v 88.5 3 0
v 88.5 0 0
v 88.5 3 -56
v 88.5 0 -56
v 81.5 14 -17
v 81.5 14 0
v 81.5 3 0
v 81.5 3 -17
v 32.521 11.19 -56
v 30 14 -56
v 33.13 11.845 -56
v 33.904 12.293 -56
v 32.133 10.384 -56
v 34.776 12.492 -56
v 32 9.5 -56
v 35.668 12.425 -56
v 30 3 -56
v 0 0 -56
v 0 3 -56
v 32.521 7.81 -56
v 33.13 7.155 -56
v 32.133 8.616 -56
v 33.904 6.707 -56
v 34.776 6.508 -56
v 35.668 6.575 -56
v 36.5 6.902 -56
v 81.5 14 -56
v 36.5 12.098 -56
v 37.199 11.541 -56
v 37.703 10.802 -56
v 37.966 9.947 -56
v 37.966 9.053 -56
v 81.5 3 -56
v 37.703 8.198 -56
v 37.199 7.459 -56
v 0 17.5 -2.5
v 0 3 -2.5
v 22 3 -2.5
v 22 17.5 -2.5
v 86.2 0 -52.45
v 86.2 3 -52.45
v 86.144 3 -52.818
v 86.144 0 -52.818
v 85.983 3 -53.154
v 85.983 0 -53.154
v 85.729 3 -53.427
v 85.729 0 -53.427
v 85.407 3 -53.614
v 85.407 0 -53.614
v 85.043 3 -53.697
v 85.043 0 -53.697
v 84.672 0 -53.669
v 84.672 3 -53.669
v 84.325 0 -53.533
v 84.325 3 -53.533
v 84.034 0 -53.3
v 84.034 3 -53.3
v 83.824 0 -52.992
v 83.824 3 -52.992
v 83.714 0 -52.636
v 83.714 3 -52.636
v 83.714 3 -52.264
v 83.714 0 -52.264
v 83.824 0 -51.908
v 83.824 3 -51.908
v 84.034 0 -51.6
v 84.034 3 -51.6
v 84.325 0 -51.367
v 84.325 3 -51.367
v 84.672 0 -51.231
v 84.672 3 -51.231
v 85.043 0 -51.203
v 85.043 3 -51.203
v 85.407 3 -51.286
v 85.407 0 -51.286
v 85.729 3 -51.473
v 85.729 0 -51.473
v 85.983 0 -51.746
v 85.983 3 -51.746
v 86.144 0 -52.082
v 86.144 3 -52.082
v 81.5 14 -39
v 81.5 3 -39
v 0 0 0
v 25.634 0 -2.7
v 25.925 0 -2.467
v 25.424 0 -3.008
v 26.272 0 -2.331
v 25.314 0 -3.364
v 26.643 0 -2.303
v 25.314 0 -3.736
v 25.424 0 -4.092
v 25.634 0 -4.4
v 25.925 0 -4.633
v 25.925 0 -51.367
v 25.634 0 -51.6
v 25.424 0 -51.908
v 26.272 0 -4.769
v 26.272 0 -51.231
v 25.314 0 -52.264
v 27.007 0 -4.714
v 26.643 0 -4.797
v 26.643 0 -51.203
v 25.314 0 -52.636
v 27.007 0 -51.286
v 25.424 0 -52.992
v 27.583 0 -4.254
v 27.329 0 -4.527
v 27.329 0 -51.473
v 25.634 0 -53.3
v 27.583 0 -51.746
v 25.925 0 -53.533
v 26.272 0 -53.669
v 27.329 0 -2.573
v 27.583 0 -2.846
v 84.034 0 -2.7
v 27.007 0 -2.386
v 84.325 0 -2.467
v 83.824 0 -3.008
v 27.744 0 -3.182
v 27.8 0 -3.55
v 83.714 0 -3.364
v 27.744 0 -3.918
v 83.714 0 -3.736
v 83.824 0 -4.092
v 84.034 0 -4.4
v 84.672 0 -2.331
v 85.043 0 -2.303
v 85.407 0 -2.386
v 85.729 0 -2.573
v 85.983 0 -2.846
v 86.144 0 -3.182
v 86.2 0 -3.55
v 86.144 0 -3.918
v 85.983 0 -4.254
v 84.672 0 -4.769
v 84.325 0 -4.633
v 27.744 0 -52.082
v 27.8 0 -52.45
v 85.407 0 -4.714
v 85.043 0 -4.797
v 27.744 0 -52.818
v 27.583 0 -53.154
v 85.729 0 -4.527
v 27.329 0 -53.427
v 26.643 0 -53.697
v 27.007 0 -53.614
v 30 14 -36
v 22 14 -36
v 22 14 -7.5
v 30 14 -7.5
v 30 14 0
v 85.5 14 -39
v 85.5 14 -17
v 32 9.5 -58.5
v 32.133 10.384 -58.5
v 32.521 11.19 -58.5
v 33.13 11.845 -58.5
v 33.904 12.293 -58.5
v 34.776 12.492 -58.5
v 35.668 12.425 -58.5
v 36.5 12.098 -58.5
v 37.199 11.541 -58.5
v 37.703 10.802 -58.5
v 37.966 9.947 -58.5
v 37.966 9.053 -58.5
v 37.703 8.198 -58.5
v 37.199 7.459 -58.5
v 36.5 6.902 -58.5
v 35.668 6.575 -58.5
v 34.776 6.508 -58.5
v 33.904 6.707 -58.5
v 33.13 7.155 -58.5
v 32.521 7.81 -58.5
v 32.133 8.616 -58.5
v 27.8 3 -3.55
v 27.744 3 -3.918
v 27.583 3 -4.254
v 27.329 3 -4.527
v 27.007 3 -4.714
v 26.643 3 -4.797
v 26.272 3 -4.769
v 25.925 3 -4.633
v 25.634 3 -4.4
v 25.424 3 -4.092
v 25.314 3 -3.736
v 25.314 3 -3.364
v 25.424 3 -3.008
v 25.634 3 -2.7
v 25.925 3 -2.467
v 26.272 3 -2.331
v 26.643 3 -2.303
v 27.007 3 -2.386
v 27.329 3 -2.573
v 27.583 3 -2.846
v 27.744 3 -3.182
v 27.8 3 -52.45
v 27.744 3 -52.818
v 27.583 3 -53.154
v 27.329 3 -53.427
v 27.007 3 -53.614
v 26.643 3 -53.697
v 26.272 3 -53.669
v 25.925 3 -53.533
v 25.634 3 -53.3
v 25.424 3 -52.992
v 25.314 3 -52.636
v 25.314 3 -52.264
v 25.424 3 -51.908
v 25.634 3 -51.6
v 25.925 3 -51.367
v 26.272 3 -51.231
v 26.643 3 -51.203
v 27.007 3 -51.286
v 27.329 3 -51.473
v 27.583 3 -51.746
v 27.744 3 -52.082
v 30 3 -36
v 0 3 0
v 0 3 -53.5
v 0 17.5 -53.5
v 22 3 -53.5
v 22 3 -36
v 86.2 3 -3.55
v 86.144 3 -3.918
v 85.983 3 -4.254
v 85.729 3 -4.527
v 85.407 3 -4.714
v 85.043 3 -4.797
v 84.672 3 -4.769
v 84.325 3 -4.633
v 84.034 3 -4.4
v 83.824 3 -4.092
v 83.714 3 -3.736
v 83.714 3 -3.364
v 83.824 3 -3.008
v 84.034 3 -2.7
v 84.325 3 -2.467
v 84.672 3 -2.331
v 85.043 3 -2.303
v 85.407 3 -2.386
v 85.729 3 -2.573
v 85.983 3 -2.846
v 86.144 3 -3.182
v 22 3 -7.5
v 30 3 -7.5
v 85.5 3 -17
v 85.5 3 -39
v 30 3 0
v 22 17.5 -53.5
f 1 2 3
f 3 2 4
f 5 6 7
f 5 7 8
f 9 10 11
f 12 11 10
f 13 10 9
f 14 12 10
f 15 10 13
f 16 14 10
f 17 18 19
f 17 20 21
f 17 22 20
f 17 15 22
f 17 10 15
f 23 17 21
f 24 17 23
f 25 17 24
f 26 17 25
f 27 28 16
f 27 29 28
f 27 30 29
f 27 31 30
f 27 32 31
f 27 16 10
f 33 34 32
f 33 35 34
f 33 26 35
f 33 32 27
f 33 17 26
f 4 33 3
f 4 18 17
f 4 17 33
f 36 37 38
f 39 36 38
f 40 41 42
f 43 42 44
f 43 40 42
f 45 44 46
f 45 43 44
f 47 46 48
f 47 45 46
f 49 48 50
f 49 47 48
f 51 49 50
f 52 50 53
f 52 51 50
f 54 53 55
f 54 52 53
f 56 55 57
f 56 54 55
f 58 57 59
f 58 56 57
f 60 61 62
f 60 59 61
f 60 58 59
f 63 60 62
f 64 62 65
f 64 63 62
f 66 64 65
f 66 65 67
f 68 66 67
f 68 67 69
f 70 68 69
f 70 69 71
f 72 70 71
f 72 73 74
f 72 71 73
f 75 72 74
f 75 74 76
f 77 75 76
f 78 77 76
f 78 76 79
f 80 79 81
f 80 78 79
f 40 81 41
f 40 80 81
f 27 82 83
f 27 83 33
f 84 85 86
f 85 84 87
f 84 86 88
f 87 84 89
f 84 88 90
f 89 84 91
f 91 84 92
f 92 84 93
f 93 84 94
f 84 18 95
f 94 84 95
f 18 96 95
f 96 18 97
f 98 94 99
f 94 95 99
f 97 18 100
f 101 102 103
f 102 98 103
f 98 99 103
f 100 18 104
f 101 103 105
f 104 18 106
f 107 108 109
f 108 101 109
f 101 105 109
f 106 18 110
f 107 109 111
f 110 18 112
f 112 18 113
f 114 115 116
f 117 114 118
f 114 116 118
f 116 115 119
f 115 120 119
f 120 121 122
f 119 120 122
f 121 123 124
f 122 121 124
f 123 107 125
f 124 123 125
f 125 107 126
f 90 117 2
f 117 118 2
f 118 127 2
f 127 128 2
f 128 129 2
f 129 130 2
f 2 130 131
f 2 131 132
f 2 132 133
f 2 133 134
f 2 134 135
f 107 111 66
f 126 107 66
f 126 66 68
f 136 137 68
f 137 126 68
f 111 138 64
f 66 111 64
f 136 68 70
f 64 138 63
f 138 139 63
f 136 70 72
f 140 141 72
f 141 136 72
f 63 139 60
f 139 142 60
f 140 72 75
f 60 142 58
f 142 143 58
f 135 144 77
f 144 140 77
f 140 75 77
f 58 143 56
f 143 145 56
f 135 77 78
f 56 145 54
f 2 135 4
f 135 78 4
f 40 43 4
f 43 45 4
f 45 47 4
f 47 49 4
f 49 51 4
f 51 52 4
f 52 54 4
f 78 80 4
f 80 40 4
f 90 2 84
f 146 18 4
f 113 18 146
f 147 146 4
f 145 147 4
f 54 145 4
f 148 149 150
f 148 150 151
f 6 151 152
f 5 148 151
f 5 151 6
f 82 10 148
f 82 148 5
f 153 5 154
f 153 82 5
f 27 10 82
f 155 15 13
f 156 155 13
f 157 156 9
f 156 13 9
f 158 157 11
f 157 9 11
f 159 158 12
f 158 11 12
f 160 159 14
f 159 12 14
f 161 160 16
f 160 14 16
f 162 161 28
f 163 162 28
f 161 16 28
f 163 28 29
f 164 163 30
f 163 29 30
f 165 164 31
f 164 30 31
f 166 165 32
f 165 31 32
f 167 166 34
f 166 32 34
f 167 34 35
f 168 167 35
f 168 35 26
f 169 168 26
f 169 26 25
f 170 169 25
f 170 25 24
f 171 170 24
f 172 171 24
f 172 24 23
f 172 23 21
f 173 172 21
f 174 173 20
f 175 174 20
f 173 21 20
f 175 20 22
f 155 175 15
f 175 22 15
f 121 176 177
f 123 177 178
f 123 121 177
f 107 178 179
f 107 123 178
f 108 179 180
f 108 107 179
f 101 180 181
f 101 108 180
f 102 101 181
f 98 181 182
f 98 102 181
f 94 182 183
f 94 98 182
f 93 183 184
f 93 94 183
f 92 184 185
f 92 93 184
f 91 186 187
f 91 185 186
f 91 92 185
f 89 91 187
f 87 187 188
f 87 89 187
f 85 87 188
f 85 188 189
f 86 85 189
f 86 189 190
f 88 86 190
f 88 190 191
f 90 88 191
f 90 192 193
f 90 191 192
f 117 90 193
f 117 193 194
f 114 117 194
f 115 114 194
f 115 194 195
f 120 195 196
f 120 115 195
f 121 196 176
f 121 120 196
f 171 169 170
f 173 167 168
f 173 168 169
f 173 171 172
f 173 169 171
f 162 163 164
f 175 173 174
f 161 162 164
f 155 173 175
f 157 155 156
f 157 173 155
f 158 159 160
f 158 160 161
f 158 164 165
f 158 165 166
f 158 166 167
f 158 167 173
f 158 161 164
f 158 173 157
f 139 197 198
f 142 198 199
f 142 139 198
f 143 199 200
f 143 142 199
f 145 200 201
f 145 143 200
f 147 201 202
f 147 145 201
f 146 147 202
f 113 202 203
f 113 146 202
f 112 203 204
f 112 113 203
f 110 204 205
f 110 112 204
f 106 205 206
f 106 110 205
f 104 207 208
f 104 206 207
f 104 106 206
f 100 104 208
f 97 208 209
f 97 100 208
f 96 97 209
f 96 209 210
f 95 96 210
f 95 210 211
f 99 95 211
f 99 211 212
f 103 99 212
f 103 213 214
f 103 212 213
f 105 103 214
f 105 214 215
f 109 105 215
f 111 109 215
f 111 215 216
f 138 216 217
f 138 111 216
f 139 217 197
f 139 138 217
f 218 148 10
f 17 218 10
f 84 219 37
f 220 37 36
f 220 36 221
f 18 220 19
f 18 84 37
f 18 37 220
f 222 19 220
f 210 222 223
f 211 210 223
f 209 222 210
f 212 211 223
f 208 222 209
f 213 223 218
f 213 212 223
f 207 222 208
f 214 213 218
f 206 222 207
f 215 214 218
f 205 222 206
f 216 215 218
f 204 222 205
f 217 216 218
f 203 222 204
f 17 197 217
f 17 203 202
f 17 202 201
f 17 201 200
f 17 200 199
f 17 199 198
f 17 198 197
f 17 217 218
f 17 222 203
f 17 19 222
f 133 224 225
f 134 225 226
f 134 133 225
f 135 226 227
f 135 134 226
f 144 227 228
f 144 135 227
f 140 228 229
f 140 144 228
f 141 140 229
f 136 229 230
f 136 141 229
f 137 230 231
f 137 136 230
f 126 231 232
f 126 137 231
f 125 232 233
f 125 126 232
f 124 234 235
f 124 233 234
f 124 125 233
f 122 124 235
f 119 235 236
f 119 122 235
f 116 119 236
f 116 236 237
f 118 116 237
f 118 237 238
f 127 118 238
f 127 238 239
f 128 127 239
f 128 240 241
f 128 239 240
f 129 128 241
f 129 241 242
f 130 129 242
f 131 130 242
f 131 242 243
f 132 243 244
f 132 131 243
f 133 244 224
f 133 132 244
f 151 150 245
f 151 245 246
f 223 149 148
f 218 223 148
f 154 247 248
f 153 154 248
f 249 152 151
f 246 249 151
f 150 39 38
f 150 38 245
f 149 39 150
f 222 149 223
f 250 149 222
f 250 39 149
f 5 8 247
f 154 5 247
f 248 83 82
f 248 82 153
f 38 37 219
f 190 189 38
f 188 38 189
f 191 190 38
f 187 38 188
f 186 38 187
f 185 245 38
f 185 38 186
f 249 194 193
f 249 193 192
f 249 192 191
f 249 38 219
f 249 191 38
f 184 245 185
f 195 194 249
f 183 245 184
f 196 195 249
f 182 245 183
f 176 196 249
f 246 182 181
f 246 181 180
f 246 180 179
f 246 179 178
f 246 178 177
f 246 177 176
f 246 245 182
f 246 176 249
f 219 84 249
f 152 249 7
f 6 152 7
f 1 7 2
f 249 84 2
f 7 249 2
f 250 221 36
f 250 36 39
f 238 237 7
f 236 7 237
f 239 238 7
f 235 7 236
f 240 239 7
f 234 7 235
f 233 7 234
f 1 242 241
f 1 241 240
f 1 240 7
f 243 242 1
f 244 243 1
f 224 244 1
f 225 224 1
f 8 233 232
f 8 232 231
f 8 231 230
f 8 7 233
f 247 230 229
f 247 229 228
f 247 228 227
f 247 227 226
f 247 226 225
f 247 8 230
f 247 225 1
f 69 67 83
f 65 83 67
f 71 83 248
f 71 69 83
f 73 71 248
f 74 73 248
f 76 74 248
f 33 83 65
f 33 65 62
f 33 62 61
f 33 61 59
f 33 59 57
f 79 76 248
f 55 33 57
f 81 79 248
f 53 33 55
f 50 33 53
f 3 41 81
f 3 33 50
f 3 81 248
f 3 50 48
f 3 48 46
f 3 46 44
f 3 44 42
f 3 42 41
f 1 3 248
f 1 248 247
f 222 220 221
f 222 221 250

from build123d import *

# Parameters (mm, degrees)
SKETCH2_W               = 88.5
SKETCH2_H               = 56
BOSS_EXTRUDE1_DEPTH     = 3
SKETCH3_W               = 63.5
SKETCH3_H               = 56
BOSS_EXTRUDE2_DEPTH     = 11
SKETCH4_W               = 22
SKETCH4_H               = 51
BOSS_EXTRUDE3_DEPTH     = 14.5
SKETCH5_W               = 4
SKETCH5_H               = 17
SKETCH5_W_2             = 8
SKETCH5_H_2             = 7.5
SKETCH5_H_3             = 20
CUT_EXTRUDE1_DEPTH      = 4.5
CUT_EXTRUDE1_DEPTH_BACK = 11
SKETCH6_R               = 1.25
CUT_EXTRUDE2_DEPTH      = 18.5
CUT_EXTRUDE2_DEPTH_BACK = 1
SKETCH8_R               = 3
BOSS_EXTRUDE4_DEPTH     = 2.5


with BuildPart() as part:
    # Sketch2 → Boss-Extrude1 (new body)
    with BuildSketch(Plane(origin=(0, 0, 0), x_dir=(1, 0, 0), z_dir=(0, 1, 0))):
        with Locations((44.25, 28)):
            Rectangle(SKETCH2_W, SKETCH2_H)
    extrude(amount=BOSS_EXTRUDE1_DEPTH)

    # Sketch3 → Boss-Extrude2 (add)
    with BuildSketch(Plane(origin=(0, 3, 0), x_dir=(1, 0, 0), z_dir=(0, 1, 0))):
        with Locations((53.75, 28)):
            Rectangle(SKETCH3_W, SKETCH3_H)
    extrude(amount=BOSS_EXTRUDE2_DEPTH)

    # Sketch4 → Boss-Extrude3 (add)
    with BuildSketch(Plane(origin=(0, 3, 0), x_dir=(1, 0, 0), z_dir=(0, 1, 0))):
        with Locations((11, 28)):
            Rectangle(SKETCH4_W, SKETCH4_H)
    extrude(amount=BOSS_EXTRUDE3_DEPTH)

    # Sketch5 → Cut-Extrude1 (cut, two sides)
    with BuildSketch(Plane(origin=(0, 14, 0), x_dir=(1, 0, 0), z_dir=(0, 1, 0))) as cut_extrude1_sk:
        with Locations((83.5, 8.5)):
            Rectangle(SKETCH5_W, SKETCH5_H)
        with Locations((83.5, 47.5)):
            Rectangle(SKETCH5_W, SKETCH5_H)
        with Locations((26, 3.75)):
            Rectangle(SKETCH5_W_2, SKETCH5_H_2)
        with Locations((26, 46)):
            Rectangle(SKETCH5_W_2, SKETCH5_H_3)
    extrude(amount=CUT_EXTRUDE1_DEPTH, mode=Mode.SUBTRACT)
    extrude(cut_extrude1_sk.sketch, amount=-CUT_EXTRUDE1_DEPTH_BACK, mode=Mode.SUBTRACT)

    # Sketch6 → Cut-Extrude2 (cut, two sides)
    with BuildSketch(Plane(origin=(0, 0, 0), x_dir=(1, 0, 0), z_dir=(0, 1, 0))) as cut_extrude2_sk:
        with Locations((84.95, 52.45)):
            Circle(SKETCH6_R)
        with Locations((84.95, 3.55)):
            Circle(SKETCH6_R)
        with Locations((26.55, 3.55)):
            Circle(SKETCH6_R)
        with Locations((26.55, 52.45)):
            Circle(SKETCH6_R)
    extrude(amount=CUT_EXTRUDE2_DEPTH, mode=Mode.SUBTRACT)
    extrude(cut_extrude2_sk.sketch, amount=-CUT_EXTRUDE2_DEPTH_BACK, mode=Mode.SUBTRACT)

    # Sketch8 → Boss-Extrude4 (add)
    with BuildSketch(Plane(origin=(0, 0, -56), x_dir=(-1, 0, 0), z_dir=(0, 0, -1))):
        with Locations((-35, 9.5)):
            Circle(SKETCH8_R)
    extrude(amount=BOSS_EXTRUDE4_DEPTH)


solid = part.part
